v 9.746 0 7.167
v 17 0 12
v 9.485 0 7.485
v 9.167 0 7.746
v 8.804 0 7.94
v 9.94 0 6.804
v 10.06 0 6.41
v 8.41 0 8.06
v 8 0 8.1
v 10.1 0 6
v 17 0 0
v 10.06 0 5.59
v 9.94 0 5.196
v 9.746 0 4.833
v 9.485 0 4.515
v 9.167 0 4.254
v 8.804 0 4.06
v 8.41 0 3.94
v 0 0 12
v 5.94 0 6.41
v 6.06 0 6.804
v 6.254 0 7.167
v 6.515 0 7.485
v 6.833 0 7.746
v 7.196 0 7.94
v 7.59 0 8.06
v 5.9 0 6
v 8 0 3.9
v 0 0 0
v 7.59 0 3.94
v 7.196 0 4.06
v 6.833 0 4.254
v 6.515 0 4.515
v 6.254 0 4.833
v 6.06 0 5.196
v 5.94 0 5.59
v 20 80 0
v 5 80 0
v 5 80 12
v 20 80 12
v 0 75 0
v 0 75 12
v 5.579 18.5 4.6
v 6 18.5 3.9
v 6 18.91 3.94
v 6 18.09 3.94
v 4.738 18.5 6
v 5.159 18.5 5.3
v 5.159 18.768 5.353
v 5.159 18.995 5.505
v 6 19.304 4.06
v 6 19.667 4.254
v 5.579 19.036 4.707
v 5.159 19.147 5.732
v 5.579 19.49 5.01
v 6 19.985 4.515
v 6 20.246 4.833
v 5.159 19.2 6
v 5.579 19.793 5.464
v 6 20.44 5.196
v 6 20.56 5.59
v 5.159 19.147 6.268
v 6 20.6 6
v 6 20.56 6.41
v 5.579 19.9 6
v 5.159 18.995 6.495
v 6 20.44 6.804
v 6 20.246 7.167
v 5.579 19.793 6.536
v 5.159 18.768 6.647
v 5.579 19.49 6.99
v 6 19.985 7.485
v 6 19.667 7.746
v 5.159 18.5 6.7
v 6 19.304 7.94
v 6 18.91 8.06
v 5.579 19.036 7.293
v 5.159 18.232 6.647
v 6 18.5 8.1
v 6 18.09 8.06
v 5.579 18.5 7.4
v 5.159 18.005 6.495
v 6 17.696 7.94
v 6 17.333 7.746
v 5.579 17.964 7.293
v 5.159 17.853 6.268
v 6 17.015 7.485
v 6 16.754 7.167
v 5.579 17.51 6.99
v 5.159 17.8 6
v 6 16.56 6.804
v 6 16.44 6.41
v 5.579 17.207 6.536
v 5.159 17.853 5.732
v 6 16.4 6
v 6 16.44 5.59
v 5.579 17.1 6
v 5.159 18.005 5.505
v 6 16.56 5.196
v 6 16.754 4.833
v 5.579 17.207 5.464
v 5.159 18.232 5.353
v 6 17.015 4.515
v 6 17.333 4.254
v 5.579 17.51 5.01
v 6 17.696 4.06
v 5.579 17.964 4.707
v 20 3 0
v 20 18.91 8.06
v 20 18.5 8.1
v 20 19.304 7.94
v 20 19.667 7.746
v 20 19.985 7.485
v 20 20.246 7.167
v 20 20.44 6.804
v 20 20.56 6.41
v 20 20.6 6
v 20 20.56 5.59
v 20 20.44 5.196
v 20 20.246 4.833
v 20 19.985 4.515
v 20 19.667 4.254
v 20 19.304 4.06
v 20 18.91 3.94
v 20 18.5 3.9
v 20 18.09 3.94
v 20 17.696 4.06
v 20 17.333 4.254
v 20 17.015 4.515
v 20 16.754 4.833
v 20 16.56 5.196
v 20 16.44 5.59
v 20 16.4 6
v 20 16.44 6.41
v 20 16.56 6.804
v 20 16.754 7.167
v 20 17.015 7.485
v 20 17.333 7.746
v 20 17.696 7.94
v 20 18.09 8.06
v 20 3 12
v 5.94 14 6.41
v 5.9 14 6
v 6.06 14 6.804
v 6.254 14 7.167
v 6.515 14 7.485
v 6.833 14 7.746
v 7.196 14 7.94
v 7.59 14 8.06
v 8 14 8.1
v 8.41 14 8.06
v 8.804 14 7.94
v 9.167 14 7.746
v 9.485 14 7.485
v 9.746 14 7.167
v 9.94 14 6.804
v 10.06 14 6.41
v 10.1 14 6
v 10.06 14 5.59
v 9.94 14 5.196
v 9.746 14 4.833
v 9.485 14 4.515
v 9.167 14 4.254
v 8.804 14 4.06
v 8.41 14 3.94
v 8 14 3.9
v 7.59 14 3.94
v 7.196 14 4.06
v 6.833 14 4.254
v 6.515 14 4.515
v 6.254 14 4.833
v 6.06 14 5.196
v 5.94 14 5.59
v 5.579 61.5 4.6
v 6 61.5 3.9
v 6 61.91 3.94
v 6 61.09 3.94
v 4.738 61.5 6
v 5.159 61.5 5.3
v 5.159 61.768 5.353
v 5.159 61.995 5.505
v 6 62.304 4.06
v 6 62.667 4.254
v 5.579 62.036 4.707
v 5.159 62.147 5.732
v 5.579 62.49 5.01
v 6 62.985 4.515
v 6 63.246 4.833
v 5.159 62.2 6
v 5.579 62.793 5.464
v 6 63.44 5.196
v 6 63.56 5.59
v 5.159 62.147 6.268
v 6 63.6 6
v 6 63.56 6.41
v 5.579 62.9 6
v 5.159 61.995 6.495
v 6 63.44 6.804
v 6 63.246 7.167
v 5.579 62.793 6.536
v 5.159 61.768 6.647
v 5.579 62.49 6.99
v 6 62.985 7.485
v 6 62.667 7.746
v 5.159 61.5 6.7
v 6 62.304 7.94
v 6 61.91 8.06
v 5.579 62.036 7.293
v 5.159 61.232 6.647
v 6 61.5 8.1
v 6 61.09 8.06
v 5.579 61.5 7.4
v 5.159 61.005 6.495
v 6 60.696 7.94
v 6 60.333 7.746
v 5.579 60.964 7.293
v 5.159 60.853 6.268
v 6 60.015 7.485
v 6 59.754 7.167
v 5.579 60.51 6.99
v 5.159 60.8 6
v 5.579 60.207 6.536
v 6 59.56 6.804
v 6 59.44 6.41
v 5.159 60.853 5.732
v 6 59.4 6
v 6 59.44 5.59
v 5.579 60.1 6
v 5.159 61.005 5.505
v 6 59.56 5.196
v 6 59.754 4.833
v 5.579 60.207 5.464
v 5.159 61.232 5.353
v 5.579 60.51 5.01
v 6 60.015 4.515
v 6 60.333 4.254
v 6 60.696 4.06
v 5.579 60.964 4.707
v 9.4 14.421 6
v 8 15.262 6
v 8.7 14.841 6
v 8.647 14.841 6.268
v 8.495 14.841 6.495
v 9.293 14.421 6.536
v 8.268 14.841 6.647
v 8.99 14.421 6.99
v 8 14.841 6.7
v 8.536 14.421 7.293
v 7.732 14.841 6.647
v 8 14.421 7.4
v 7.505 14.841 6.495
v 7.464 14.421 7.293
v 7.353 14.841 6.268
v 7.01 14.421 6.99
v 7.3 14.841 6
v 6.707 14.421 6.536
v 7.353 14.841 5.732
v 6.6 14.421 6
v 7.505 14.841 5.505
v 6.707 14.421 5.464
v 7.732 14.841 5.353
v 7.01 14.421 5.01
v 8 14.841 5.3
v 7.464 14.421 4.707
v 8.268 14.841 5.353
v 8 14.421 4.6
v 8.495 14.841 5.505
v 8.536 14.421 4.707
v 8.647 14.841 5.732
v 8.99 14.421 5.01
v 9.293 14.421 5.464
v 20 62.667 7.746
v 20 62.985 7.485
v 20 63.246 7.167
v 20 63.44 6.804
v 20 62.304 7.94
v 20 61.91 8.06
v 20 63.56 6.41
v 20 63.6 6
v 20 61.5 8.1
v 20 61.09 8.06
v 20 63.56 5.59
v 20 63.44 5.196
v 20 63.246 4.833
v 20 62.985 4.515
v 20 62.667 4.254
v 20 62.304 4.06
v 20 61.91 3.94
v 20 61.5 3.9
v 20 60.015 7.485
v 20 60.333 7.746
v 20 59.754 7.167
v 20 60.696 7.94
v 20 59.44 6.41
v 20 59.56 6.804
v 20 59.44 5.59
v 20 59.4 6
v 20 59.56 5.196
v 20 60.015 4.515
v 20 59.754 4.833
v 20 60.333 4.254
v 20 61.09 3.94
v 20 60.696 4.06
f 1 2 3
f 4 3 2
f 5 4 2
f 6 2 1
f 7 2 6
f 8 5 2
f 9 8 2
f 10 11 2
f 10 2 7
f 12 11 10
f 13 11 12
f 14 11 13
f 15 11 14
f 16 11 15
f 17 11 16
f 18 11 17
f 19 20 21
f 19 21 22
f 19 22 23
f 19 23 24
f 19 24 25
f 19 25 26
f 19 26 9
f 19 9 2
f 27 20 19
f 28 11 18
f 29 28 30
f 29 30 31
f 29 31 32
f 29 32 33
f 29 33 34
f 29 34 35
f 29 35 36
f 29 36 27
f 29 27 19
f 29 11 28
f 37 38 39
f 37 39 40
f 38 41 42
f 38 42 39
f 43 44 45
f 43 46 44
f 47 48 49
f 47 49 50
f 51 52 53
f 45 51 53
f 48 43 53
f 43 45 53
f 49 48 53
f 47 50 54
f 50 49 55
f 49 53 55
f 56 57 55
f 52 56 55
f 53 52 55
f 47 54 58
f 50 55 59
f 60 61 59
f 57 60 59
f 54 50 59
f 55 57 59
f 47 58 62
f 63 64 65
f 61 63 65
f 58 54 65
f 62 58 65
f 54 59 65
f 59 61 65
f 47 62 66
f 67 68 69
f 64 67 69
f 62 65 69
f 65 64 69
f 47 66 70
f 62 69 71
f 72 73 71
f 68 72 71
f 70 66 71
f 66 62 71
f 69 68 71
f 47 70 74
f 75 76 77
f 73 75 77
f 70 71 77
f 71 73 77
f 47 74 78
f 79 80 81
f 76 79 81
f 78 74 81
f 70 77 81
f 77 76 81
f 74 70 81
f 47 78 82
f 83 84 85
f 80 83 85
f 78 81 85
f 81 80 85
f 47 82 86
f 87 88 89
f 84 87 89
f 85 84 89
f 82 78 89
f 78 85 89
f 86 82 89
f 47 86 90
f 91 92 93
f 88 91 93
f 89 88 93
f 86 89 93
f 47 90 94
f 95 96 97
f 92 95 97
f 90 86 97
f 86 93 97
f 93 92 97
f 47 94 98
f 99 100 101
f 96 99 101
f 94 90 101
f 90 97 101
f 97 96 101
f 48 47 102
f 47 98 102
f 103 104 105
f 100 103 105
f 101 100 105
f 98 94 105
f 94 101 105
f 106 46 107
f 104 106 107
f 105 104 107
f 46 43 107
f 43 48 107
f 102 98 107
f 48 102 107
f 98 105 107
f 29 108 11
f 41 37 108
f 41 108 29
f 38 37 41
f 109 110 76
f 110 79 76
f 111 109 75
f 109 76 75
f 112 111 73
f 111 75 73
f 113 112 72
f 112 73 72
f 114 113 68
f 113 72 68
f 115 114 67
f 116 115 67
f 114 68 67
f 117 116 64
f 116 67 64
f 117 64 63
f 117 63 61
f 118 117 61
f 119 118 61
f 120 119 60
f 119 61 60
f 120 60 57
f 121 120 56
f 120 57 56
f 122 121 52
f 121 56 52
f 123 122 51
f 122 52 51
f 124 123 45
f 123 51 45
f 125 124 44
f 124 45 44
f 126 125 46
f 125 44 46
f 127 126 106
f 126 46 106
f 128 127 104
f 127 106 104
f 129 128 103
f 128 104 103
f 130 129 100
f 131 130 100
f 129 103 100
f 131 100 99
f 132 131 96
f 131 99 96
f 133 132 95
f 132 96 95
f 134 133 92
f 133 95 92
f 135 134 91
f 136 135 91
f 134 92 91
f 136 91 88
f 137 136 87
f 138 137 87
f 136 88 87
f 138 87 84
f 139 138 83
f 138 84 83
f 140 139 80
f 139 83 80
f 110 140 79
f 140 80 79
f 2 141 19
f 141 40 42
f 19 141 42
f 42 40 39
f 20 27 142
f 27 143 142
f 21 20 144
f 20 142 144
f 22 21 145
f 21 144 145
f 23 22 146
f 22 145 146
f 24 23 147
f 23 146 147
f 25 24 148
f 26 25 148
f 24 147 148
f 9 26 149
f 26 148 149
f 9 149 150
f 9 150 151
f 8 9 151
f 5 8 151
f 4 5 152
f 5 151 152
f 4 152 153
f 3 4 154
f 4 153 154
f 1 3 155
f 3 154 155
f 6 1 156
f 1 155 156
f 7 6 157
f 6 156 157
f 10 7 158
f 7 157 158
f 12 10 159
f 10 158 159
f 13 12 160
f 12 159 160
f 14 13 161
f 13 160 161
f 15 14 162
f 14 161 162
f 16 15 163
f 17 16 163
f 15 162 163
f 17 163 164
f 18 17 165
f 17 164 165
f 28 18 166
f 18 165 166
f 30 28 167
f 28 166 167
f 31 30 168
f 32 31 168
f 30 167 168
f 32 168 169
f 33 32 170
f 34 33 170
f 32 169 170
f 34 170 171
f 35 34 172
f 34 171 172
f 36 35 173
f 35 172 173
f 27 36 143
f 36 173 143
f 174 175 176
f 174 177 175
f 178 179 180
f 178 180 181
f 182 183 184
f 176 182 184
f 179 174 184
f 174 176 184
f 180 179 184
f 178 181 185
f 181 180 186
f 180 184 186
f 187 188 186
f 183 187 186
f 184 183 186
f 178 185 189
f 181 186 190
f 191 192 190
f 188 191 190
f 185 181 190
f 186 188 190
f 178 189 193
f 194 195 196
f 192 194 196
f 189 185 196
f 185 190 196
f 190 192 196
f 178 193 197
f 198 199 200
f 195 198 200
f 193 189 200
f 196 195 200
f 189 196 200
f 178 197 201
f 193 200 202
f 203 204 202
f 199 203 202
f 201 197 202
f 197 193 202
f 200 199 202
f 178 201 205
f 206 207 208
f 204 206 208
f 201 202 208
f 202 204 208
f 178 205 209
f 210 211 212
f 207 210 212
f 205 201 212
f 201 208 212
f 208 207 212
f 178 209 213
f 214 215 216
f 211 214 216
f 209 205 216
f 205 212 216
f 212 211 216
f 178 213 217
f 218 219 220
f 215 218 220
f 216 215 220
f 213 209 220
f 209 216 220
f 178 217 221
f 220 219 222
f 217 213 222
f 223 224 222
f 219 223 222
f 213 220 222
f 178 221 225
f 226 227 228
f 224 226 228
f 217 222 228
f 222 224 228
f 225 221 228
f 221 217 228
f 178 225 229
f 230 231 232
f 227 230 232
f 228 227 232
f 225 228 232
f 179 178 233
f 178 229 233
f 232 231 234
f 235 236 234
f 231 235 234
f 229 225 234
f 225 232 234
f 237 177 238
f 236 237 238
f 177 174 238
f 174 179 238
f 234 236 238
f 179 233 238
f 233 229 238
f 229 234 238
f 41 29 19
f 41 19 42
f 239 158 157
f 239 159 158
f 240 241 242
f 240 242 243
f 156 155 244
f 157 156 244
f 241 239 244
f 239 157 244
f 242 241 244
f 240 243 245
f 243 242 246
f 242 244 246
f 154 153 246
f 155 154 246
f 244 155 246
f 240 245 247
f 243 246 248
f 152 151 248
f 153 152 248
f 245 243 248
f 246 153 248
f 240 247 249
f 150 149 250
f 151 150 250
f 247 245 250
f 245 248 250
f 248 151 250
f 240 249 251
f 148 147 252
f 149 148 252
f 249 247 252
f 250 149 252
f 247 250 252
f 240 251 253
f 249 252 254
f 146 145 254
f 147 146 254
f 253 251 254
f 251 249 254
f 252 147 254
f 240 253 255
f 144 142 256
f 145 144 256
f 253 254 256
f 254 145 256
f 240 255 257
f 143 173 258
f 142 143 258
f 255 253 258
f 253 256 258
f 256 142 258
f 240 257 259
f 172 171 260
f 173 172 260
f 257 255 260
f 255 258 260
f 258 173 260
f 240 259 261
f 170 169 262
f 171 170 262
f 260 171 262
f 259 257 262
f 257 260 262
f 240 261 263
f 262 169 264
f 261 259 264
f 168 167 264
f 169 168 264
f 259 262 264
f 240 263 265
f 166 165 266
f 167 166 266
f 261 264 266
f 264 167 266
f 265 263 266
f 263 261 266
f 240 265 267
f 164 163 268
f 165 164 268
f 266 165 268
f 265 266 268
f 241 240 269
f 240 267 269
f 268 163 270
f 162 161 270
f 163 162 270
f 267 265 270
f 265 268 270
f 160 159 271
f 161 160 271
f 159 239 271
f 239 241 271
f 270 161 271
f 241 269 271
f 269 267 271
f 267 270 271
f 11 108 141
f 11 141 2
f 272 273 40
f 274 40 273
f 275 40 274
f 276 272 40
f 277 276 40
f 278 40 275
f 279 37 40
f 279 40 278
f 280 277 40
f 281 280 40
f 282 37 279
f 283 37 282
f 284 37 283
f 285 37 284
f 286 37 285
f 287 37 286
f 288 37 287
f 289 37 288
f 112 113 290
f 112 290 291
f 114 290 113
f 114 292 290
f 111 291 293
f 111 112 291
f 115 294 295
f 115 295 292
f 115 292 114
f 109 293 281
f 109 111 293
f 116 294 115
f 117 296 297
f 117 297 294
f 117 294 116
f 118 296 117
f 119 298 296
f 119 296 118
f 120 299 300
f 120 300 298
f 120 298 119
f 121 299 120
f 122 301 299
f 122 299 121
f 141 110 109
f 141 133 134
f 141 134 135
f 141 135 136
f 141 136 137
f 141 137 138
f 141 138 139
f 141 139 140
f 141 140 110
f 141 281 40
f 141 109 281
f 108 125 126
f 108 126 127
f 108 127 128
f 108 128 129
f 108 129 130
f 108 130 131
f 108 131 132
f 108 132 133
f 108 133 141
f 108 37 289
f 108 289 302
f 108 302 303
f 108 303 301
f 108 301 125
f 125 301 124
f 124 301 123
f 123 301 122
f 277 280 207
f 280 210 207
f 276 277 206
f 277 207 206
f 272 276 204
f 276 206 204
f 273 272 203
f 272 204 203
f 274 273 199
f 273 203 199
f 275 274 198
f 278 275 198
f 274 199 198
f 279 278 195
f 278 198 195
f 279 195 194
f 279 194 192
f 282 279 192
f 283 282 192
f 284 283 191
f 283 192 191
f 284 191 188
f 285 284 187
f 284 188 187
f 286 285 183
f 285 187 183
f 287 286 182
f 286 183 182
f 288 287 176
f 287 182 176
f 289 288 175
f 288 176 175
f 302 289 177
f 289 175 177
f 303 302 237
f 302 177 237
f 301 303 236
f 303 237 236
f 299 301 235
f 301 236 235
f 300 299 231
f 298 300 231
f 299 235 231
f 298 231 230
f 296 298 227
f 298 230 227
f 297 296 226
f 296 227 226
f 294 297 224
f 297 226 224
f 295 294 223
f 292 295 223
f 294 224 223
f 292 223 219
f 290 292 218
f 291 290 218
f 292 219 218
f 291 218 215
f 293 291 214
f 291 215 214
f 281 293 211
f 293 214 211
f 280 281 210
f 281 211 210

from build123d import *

# Parameters (mm, degrees)
BOSS_EXTRUDE1_DEPTH       = 12
M5X0_8_TAPPED_HOLE1_D     = 4.2
M5X0_8_TAPPED_HOLE1_DEPTH = 14
M5X0_8_TAPPED_HOLE1_TIP   = 1.2618073
M5X0_8_TAPPED_HOLE2_D     = 4.2
M5X0_8_TAPPED_HOLE2_DEPTH = 14
M5X0_8_TAPPED_HOLE2_TIP   = 1.2618073


with BuildPart() as part:
    # Sketch1 → Boss-Extrude1 (new body)
    with BuildSketch(Plane.XY):
        Polygon((0, 75), (5, 80), (20, 80), (20, 3), (17, 0), (0, 0), align=None)
    extrude(amount=BOSS_EXTRUDE1_DEPTH)

    # M5x0.8 Tapped Hole1
    with Locations(Plane.XZ):
        with Locations((8, 6)):
            Hole(M5X0_8_TAPPED_HOLE1_D / 2, depth=M5X0_8_TAPPED_HOLE1_DEPTH)
            with Locations((0, 0, -(M5X0_8_TAPPED_HOLE1_DEPTH + M5X0_8_TAPPED_HOLE1_TIP / 2))):  # 118° drill point
                Cone(0, M5X0_8_TAPPED_HOLE1_D / 2, M5X0_8_TAPPED_HOLE1_TIP, mode=Mode.SUBTRACT)

    # M5x0.8 Tapped Hole2
    with Locations(Plane(origin=(20, 0, 0), x_dir=(0, 0, -1), z_dir=(1, 0, 0))):
        with Locations((-6, 18.5), (-6, 61.5)):
            Hole(M5X0_8_TAPPED_HOLE2_D / 2, depth=M5X0_8_TAPPED_HOLE2_DEPTH)
            with Locations((0, 0, -(M5X0_8_TAPPED_HOLE2_DEPTH + M5X0_8_TAPPED_HOLE2_TIP / 2))):  # 118° drill point
                Cone(0, M5X0_8_TAPPED_HOLE2_D / 2, M5X0_8_TAPPED_HOLE2_TIP, mode=Mode.SUBTRACT)


solid = part.part
